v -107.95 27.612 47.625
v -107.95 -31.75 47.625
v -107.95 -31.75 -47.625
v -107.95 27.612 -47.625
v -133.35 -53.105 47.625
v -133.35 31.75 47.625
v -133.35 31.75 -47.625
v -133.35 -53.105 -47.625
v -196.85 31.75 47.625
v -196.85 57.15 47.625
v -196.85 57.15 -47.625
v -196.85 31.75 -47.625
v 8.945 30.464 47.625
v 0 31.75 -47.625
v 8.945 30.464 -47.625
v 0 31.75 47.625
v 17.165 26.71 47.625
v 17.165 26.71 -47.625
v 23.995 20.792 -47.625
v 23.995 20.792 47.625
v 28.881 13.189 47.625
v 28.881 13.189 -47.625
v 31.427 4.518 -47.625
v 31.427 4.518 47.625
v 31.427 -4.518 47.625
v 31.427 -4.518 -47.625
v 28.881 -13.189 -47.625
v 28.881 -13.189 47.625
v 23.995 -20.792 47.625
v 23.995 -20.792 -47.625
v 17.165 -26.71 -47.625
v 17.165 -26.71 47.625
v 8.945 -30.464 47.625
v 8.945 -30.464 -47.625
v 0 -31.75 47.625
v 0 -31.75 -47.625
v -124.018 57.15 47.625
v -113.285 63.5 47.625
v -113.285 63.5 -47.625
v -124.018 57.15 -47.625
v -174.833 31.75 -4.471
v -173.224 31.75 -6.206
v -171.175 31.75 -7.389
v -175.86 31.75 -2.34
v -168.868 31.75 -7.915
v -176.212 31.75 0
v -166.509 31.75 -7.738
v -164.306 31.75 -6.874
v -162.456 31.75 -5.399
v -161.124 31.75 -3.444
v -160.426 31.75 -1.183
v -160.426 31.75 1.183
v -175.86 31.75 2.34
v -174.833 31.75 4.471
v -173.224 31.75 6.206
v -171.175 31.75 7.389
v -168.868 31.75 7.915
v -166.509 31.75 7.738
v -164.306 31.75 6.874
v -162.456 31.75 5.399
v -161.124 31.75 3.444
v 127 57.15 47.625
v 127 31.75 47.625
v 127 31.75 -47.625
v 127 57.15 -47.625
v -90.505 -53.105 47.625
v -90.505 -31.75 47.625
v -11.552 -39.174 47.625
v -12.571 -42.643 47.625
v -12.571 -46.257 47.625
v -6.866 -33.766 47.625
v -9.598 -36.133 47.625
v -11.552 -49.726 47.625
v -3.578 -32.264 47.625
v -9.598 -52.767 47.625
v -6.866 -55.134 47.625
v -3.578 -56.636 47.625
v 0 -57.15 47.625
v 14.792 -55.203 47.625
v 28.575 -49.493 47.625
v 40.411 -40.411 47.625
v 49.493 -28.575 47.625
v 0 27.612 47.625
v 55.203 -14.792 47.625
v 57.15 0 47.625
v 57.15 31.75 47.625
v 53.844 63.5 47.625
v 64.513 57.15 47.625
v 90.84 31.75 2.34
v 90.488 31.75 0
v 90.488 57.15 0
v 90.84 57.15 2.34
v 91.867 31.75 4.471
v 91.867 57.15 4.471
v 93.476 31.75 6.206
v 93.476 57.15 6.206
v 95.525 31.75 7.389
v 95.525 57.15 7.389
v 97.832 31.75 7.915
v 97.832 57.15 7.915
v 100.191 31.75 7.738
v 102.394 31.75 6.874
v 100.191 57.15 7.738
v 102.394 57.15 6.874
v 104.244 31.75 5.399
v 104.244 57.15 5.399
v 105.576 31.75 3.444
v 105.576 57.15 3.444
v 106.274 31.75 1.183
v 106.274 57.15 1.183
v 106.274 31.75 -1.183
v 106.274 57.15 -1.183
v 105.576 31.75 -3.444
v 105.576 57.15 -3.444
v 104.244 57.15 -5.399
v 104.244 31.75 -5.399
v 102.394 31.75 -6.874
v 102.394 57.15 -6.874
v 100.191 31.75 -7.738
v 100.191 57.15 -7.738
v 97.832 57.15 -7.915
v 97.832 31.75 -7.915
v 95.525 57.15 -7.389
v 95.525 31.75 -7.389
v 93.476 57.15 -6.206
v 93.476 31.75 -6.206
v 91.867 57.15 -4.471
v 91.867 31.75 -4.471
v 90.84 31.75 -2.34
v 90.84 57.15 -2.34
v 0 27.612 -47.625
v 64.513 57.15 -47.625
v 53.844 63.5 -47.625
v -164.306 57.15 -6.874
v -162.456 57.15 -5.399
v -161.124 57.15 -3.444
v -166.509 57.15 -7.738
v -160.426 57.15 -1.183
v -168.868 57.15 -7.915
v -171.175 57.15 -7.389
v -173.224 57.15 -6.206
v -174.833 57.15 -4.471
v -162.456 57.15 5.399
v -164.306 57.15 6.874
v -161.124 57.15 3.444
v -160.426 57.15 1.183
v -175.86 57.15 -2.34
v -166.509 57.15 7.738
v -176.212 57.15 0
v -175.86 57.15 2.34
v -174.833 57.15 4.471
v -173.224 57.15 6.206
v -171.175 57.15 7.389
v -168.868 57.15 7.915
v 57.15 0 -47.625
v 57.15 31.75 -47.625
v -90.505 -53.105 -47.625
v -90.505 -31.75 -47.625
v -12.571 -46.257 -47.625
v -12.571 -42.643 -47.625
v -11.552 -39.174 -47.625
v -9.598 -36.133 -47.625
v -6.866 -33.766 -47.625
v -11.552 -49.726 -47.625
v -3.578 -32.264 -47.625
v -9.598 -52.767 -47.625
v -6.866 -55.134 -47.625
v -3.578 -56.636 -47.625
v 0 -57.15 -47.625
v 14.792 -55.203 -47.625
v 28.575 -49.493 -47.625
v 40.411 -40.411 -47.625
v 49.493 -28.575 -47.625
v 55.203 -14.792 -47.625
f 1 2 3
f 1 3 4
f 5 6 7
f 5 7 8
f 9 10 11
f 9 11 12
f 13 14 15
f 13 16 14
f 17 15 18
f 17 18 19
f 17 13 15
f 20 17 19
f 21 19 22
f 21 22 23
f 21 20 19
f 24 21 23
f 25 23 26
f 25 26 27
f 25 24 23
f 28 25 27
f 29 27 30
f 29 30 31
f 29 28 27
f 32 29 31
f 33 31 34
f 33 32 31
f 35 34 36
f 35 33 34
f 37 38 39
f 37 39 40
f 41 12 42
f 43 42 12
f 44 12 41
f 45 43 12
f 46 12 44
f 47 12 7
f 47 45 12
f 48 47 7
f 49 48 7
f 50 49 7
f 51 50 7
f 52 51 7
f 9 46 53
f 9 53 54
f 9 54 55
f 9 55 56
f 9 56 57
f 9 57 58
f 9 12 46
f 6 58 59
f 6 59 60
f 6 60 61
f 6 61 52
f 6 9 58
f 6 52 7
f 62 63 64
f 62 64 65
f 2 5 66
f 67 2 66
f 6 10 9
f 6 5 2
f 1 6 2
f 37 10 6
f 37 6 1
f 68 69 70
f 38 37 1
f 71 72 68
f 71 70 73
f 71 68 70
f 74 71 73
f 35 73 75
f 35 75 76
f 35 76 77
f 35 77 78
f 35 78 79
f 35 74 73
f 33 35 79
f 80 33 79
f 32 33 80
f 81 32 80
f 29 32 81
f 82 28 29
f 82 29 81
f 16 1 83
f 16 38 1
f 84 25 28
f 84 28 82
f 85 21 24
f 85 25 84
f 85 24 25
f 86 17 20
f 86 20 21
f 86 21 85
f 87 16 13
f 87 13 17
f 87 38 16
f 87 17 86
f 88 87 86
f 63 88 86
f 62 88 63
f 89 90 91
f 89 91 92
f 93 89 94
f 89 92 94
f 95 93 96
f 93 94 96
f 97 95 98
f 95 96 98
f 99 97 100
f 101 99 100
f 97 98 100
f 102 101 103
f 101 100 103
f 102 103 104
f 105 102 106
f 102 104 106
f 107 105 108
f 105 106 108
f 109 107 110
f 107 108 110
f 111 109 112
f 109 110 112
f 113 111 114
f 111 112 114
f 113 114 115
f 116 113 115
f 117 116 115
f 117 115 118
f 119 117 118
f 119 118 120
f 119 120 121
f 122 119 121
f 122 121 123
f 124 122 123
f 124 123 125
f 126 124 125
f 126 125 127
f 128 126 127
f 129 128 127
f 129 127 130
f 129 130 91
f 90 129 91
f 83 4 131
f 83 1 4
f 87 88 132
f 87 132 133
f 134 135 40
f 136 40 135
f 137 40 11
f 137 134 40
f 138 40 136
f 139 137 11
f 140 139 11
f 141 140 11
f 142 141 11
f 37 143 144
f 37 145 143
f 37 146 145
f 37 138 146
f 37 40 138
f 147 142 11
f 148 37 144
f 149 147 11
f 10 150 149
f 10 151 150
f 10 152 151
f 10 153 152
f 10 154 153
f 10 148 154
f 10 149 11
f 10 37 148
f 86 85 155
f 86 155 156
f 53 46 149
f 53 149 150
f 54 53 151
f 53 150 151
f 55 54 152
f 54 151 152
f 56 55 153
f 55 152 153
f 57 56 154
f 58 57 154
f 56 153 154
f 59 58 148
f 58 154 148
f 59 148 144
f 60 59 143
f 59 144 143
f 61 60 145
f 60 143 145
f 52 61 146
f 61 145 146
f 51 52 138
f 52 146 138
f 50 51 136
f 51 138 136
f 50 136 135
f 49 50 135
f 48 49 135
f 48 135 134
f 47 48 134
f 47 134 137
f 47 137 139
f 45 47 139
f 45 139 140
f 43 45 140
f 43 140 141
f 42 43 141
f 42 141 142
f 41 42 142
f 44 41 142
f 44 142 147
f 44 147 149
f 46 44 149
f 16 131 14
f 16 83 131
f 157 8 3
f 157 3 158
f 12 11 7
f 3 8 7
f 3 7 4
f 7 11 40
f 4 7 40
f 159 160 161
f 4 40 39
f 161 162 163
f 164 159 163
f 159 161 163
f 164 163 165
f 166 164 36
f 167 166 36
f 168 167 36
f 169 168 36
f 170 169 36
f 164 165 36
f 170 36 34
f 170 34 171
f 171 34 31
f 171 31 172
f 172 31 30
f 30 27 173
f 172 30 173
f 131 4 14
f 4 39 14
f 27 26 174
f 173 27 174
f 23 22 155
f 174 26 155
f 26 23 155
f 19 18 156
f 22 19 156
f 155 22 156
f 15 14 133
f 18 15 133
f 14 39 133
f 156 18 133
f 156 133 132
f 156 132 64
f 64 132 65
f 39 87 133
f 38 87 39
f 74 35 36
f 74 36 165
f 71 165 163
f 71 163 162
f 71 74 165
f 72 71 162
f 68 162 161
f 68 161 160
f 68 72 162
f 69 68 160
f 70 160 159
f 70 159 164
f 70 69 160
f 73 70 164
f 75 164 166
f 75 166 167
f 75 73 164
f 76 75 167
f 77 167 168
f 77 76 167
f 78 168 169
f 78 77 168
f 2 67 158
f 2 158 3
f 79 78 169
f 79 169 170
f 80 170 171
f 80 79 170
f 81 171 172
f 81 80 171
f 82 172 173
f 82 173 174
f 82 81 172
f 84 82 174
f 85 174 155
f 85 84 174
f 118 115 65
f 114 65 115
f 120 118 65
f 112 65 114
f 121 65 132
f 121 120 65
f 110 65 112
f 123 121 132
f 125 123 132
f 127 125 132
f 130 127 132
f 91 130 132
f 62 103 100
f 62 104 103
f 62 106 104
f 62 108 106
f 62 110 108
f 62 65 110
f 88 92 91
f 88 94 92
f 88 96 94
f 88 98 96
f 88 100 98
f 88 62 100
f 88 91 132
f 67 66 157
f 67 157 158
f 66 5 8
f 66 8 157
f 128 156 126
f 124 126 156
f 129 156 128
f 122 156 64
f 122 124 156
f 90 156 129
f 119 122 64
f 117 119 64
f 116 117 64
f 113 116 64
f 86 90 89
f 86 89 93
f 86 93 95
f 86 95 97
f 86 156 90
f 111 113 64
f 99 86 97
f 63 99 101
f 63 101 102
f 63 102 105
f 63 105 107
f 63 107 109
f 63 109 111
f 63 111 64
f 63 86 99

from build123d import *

# Parameters (mm, degrees)
F1_DEPTH = 47.625
F2_R     = 7.9375
F3_DEPTH = 114.301


with BuildPart() as f1:
    # F0 (on Top) → F1 (new body, symmetric)
    with BuildSketch(Plane.XY):
        with BuildLine():
            ThreePointArc((0, 31.75), (31.75, 0), (0, -31.75))
            ThreePointArc((0, -31.75), (-12.7, -44.45), (0, -57.15))
            ThreePointArc((0, -57.15), (40.4111525448, -40.4111525448), (57.15, 0))
            Line((57.15, 0), (57.15, 31.75))
            Line((57.15, 31.75), (127, 31.75))
            Line((127, 31.75), (127, 57.15))
            Line((127, 57.15), (64.5130766445, 57.15))
            Line((64.5130766445, 57.15), (53.8438755383, 63.5))
            Line((53.8438755383, 63.5), (-113.2848898665, 63.5))
            Line((-113.2848898665, 63.5), (-124.0183680439, 57.15))
            Line((-124.0183680439, 57.15), (-196.85, 57.15))
            Line((-196.85, 57.15), (-196.85, 31.75))
            Line((-196.85, 31.75), (-133.35, 31.75))
            Line((-133.35, 31.75), (-133.35, -53.1049028658))
            Line((-133.35, -53.1049028658), (-90.5046517968, -53.1049028658))
            Line((-90.5046517968, -53.1049028658), (-90.5046517968, -31.75))
            Line((-90.5046517968, -31.75), (-107.95, -31.75))
            Line((-107.95, -31.75), (-107.95, 27.6119898381))
            Line((-107.95, 27.6119898381), (0, 27.6119898381))
            Line((0, 27.6119898381), (0, 31.75))
        make_face()
    extrude(amount=F1_DEPTH, both=True)

    # F2 (on face) → F3 (cut, through all)
    with BuildSketch(Plane(origin=(0, 57.15, 0), x_dir=(-1, 0, 0), z_dir=(0, 1, 0))):
        with Locations((-98.425, 0)):
            Circle(F2_R)
        with Locations((168.275, 0)):
            Circle(F2_R)
    extrude(amount=-F3_DEPTH, mode=Mode.SUBTRACT)


solid = f1.part
